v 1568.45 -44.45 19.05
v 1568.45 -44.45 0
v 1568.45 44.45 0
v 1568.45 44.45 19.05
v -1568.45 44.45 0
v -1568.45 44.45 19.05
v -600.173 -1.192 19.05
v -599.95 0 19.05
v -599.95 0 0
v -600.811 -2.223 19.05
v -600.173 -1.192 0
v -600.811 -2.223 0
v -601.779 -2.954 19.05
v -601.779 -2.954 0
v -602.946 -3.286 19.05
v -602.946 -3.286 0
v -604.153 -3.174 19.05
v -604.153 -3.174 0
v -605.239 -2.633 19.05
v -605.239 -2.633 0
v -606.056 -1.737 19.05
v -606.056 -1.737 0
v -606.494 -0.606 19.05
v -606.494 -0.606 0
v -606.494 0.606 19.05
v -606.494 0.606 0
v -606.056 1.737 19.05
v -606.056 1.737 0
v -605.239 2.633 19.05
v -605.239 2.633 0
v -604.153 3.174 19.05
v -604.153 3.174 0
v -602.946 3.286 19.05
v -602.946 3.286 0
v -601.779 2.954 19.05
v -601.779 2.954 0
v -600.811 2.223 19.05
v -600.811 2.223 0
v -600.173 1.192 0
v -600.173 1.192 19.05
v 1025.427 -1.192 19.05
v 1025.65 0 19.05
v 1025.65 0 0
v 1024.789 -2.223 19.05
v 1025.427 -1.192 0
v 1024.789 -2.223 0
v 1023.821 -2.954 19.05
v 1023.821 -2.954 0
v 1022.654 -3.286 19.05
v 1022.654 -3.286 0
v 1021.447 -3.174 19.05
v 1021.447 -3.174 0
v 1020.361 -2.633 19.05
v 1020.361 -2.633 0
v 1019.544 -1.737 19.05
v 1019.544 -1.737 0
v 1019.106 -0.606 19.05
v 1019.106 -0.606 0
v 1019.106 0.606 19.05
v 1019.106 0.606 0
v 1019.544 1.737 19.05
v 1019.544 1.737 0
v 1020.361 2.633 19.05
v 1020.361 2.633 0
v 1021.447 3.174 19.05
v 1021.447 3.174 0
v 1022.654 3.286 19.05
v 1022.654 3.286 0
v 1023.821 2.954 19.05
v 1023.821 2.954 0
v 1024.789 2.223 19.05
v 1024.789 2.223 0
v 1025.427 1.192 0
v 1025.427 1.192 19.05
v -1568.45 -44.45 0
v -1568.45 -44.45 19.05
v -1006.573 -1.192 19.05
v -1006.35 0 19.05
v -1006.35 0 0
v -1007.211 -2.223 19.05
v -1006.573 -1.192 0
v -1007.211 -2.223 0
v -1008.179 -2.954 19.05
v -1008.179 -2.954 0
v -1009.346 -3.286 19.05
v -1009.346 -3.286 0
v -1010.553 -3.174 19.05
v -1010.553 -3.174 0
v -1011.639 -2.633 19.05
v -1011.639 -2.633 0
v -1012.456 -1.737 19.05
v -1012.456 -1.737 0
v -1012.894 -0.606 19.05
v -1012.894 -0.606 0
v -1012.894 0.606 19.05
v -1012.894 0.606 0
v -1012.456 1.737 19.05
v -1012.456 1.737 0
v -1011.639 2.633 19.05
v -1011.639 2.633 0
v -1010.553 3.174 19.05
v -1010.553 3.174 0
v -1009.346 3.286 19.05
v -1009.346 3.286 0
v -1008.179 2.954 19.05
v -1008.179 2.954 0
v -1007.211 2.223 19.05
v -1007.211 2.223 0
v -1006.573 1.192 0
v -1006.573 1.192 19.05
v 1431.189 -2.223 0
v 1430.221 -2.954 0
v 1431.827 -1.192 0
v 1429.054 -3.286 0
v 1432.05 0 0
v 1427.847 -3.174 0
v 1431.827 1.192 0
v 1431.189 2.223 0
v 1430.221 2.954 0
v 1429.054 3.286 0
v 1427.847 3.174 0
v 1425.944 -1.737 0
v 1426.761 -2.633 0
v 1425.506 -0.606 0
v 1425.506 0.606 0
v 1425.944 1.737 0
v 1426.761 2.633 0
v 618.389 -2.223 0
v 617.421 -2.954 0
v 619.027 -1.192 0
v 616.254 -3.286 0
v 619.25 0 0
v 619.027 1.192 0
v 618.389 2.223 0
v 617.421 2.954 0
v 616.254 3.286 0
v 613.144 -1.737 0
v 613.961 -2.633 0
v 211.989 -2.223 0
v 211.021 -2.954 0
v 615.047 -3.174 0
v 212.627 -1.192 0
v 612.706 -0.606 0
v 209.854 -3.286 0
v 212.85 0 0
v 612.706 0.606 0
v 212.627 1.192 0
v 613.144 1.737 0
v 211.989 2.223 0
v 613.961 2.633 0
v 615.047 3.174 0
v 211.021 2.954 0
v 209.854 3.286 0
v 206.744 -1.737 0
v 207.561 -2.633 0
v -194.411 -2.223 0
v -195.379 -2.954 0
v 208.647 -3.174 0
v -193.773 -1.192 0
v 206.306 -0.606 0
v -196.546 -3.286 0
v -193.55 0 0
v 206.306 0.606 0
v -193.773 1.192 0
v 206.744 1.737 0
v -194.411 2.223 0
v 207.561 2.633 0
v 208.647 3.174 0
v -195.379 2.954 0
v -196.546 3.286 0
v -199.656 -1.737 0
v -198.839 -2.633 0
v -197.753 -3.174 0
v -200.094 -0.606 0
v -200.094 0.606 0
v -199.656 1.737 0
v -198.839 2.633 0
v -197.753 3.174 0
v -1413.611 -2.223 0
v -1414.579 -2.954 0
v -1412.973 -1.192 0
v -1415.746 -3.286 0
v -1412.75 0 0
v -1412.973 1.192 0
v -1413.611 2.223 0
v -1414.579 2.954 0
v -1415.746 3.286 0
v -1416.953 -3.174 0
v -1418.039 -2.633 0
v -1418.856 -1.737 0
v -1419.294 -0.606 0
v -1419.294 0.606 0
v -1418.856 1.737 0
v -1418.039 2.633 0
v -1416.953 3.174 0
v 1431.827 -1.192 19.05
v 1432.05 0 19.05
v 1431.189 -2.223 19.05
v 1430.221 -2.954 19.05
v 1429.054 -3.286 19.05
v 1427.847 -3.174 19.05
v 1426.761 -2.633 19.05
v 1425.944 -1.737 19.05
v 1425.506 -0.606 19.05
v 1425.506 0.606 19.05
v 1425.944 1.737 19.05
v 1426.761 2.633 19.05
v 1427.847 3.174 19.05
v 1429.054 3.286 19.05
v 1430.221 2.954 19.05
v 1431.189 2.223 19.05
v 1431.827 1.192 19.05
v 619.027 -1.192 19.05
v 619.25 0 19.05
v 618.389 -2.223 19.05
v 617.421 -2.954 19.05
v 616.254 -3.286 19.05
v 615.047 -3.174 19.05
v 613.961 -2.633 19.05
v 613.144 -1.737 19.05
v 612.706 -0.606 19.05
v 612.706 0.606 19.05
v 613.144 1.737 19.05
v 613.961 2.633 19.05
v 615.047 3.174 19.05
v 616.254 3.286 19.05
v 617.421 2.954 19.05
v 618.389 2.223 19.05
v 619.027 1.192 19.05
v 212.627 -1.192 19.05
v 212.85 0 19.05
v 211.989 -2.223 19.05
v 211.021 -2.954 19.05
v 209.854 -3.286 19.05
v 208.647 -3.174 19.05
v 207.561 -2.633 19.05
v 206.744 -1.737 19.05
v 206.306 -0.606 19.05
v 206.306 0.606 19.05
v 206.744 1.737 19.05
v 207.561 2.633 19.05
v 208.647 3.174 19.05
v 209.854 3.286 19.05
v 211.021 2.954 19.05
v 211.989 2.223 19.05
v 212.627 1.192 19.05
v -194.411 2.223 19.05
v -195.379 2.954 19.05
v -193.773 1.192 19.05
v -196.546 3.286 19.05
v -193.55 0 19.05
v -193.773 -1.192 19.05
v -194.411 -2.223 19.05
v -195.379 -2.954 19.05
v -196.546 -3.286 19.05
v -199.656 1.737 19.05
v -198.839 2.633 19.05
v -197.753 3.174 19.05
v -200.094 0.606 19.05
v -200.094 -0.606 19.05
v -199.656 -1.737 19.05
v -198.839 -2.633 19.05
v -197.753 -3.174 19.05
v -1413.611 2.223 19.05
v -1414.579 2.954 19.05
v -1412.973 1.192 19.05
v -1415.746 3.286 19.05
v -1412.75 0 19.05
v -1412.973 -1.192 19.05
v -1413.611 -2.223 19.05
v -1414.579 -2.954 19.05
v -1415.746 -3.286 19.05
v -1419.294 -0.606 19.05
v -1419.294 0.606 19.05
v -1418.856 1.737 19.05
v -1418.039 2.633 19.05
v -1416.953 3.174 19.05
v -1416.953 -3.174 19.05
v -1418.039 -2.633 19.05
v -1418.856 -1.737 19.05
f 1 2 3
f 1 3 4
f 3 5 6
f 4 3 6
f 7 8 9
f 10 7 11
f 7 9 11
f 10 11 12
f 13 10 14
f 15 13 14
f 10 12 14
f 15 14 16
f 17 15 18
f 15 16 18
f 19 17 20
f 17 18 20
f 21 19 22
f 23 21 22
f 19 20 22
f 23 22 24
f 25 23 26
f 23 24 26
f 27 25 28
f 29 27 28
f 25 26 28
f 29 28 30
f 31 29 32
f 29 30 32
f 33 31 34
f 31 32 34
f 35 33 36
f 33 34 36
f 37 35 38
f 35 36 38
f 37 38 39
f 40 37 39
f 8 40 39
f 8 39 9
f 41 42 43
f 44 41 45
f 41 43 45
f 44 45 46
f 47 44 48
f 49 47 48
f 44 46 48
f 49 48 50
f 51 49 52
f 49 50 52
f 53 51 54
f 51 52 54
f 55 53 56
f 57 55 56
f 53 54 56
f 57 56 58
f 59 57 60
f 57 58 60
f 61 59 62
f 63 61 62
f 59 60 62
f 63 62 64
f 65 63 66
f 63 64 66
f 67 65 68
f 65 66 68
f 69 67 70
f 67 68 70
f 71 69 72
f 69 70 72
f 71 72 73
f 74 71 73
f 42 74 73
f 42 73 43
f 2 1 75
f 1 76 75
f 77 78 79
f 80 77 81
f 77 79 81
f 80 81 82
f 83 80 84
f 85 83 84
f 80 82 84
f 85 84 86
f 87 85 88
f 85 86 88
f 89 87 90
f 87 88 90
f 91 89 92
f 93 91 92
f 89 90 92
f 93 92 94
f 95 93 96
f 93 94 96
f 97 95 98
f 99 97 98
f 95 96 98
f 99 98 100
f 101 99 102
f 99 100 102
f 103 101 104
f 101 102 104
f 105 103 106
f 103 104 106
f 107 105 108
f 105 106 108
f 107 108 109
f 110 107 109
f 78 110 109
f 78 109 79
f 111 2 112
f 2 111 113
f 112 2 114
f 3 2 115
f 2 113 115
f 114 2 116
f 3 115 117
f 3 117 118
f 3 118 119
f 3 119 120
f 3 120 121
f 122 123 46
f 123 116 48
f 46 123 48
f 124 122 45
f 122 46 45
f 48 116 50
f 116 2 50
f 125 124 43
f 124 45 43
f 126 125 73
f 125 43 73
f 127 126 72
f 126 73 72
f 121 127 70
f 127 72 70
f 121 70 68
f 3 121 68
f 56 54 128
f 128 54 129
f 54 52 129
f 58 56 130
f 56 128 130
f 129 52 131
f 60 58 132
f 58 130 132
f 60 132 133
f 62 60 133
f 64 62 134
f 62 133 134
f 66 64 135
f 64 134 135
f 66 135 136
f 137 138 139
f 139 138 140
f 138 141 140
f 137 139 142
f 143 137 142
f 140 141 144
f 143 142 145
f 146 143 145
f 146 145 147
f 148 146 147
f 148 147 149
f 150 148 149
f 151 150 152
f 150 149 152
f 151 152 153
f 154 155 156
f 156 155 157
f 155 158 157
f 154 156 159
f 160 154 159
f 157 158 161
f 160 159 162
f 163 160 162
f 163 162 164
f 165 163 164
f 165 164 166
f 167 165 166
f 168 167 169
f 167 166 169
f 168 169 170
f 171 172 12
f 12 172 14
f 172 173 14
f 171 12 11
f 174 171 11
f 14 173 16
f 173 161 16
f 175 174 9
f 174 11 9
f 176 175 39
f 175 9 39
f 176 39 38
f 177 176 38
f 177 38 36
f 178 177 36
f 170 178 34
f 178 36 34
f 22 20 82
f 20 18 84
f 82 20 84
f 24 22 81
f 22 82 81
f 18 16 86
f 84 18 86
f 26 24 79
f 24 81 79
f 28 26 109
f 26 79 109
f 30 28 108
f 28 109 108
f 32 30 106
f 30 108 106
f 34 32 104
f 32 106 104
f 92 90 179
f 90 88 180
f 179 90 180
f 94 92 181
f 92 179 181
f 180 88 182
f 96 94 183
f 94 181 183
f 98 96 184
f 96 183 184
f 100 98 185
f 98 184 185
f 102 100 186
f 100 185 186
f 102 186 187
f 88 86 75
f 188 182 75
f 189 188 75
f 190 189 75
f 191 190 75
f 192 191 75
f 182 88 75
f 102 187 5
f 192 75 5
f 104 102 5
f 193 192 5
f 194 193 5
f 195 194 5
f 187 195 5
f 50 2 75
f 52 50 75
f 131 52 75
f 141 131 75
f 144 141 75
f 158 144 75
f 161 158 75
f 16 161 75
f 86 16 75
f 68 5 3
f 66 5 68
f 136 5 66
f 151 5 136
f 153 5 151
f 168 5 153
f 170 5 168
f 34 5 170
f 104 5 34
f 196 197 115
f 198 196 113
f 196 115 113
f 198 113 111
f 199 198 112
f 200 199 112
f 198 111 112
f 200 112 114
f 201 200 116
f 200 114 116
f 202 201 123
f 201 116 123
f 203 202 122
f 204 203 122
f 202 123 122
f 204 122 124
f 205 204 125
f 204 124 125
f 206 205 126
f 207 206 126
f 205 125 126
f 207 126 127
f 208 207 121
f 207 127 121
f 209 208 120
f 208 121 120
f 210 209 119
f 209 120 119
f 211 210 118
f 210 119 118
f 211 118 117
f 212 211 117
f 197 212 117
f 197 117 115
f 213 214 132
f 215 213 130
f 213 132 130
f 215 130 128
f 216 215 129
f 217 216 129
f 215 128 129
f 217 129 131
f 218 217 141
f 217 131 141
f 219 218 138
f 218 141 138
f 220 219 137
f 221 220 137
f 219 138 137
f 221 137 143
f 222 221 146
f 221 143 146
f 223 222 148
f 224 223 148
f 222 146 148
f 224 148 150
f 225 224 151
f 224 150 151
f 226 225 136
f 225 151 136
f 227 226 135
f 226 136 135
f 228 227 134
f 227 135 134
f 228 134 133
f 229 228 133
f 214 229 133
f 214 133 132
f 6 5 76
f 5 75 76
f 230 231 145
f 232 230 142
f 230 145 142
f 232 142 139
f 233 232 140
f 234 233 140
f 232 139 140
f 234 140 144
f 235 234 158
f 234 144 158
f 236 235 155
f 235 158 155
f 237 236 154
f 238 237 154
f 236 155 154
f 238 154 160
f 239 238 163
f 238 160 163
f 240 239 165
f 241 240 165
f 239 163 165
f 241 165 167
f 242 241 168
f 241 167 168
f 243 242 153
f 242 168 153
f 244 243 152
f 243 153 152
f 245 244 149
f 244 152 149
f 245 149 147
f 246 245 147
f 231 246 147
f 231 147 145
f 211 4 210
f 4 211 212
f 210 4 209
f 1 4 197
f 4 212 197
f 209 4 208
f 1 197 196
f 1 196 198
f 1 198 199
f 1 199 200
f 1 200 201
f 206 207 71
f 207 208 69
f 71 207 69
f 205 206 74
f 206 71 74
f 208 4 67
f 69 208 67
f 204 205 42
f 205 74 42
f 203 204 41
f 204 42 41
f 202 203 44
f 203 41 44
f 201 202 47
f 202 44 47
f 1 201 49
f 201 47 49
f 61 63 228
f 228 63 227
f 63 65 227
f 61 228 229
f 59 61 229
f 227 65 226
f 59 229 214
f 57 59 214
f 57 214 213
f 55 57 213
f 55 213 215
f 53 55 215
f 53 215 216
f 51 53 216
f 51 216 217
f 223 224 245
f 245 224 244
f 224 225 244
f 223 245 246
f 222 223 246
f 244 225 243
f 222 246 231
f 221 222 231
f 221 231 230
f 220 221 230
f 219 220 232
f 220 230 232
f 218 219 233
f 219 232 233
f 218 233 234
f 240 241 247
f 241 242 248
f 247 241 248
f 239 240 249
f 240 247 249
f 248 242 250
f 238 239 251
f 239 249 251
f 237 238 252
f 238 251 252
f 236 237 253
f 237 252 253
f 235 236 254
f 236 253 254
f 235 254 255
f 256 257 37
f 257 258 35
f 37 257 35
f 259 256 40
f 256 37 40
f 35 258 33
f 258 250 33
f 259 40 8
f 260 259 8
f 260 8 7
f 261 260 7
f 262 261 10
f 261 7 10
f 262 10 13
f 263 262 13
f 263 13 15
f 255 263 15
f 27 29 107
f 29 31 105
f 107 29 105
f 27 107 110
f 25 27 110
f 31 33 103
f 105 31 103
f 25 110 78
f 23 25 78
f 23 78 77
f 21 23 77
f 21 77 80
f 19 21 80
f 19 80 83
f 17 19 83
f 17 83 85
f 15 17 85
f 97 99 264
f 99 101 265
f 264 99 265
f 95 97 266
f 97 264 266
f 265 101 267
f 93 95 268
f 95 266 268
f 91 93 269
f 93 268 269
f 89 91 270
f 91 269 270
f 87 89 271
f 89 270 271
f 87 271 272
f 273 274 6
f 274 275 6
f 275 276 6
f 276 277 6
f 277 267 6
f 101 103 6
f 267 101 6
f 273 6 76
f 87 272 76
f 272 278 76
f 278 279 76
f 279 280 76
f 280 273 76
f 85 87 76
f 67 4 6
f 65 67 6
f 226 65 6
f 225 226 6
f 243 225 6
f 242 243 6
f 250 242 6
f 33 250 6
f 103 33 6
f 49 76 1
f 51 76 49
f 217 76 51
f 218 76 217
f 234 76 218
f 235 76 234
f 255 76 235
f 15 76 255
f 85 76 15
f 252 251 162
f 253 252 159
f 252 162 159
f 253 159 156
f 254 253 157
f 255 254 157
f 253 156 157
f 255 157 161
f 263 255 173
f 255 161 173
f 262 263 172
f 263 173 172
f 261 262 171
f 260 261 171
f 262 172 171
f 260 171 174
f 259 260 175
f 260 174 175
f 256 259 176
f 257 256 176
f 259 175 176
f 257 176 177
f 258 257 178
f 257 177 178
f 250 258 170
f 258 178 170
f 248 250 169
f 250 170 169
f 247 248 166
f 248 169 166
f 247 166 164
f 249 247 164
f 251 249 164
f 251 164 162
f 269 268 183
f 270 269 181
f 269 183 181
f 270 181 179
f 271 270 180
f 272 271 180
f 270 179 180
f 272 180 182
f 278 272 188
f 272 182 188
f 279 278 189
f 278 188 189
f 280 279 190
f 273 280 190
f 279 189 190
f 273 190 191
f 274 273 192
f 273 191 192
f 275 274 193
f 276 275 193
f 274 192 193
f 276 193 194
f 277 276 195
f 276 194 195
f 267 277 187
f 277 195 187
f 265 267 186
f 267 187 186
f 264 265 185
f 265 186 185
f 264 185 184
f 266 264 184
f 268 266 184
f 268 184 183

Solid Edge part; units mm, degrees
sketch "Sketch1" plane through (0, 0, 0) normal (1, 0, 0) x (0, 1, 0)
  line L0 (-44.45, 0) -> (44.45, 0)
  line L1 (44.45, 0) -> (44.45, 19.05)
  line L2 (44.45, 19.05) -> (-44.45, 19.05)
  line L3 (-44.45, 19.05) -> (-44.45, 0)
  dimension "D1" = 88.9
  dimension "D2" = 19.05
extrude "Protrusion1" add sketch "Sketch1" along normal mid plane 3136.9
sketch "Sketch2" plane through (0, 0, 0) normal (0, 0, -1) x (1, 0, 0)
  circle A0 centre (-1416.05, 0) radius 3.3
  dimension "D1" = 6.6
  dimension "D2" = 152.4
extrude "Cutout1" cut sketch "Sketch2" against normal through all
pattern_linear "Pattern1" count 8 spacing 406.4 along (1, 0, 0) of "Cutout1"
